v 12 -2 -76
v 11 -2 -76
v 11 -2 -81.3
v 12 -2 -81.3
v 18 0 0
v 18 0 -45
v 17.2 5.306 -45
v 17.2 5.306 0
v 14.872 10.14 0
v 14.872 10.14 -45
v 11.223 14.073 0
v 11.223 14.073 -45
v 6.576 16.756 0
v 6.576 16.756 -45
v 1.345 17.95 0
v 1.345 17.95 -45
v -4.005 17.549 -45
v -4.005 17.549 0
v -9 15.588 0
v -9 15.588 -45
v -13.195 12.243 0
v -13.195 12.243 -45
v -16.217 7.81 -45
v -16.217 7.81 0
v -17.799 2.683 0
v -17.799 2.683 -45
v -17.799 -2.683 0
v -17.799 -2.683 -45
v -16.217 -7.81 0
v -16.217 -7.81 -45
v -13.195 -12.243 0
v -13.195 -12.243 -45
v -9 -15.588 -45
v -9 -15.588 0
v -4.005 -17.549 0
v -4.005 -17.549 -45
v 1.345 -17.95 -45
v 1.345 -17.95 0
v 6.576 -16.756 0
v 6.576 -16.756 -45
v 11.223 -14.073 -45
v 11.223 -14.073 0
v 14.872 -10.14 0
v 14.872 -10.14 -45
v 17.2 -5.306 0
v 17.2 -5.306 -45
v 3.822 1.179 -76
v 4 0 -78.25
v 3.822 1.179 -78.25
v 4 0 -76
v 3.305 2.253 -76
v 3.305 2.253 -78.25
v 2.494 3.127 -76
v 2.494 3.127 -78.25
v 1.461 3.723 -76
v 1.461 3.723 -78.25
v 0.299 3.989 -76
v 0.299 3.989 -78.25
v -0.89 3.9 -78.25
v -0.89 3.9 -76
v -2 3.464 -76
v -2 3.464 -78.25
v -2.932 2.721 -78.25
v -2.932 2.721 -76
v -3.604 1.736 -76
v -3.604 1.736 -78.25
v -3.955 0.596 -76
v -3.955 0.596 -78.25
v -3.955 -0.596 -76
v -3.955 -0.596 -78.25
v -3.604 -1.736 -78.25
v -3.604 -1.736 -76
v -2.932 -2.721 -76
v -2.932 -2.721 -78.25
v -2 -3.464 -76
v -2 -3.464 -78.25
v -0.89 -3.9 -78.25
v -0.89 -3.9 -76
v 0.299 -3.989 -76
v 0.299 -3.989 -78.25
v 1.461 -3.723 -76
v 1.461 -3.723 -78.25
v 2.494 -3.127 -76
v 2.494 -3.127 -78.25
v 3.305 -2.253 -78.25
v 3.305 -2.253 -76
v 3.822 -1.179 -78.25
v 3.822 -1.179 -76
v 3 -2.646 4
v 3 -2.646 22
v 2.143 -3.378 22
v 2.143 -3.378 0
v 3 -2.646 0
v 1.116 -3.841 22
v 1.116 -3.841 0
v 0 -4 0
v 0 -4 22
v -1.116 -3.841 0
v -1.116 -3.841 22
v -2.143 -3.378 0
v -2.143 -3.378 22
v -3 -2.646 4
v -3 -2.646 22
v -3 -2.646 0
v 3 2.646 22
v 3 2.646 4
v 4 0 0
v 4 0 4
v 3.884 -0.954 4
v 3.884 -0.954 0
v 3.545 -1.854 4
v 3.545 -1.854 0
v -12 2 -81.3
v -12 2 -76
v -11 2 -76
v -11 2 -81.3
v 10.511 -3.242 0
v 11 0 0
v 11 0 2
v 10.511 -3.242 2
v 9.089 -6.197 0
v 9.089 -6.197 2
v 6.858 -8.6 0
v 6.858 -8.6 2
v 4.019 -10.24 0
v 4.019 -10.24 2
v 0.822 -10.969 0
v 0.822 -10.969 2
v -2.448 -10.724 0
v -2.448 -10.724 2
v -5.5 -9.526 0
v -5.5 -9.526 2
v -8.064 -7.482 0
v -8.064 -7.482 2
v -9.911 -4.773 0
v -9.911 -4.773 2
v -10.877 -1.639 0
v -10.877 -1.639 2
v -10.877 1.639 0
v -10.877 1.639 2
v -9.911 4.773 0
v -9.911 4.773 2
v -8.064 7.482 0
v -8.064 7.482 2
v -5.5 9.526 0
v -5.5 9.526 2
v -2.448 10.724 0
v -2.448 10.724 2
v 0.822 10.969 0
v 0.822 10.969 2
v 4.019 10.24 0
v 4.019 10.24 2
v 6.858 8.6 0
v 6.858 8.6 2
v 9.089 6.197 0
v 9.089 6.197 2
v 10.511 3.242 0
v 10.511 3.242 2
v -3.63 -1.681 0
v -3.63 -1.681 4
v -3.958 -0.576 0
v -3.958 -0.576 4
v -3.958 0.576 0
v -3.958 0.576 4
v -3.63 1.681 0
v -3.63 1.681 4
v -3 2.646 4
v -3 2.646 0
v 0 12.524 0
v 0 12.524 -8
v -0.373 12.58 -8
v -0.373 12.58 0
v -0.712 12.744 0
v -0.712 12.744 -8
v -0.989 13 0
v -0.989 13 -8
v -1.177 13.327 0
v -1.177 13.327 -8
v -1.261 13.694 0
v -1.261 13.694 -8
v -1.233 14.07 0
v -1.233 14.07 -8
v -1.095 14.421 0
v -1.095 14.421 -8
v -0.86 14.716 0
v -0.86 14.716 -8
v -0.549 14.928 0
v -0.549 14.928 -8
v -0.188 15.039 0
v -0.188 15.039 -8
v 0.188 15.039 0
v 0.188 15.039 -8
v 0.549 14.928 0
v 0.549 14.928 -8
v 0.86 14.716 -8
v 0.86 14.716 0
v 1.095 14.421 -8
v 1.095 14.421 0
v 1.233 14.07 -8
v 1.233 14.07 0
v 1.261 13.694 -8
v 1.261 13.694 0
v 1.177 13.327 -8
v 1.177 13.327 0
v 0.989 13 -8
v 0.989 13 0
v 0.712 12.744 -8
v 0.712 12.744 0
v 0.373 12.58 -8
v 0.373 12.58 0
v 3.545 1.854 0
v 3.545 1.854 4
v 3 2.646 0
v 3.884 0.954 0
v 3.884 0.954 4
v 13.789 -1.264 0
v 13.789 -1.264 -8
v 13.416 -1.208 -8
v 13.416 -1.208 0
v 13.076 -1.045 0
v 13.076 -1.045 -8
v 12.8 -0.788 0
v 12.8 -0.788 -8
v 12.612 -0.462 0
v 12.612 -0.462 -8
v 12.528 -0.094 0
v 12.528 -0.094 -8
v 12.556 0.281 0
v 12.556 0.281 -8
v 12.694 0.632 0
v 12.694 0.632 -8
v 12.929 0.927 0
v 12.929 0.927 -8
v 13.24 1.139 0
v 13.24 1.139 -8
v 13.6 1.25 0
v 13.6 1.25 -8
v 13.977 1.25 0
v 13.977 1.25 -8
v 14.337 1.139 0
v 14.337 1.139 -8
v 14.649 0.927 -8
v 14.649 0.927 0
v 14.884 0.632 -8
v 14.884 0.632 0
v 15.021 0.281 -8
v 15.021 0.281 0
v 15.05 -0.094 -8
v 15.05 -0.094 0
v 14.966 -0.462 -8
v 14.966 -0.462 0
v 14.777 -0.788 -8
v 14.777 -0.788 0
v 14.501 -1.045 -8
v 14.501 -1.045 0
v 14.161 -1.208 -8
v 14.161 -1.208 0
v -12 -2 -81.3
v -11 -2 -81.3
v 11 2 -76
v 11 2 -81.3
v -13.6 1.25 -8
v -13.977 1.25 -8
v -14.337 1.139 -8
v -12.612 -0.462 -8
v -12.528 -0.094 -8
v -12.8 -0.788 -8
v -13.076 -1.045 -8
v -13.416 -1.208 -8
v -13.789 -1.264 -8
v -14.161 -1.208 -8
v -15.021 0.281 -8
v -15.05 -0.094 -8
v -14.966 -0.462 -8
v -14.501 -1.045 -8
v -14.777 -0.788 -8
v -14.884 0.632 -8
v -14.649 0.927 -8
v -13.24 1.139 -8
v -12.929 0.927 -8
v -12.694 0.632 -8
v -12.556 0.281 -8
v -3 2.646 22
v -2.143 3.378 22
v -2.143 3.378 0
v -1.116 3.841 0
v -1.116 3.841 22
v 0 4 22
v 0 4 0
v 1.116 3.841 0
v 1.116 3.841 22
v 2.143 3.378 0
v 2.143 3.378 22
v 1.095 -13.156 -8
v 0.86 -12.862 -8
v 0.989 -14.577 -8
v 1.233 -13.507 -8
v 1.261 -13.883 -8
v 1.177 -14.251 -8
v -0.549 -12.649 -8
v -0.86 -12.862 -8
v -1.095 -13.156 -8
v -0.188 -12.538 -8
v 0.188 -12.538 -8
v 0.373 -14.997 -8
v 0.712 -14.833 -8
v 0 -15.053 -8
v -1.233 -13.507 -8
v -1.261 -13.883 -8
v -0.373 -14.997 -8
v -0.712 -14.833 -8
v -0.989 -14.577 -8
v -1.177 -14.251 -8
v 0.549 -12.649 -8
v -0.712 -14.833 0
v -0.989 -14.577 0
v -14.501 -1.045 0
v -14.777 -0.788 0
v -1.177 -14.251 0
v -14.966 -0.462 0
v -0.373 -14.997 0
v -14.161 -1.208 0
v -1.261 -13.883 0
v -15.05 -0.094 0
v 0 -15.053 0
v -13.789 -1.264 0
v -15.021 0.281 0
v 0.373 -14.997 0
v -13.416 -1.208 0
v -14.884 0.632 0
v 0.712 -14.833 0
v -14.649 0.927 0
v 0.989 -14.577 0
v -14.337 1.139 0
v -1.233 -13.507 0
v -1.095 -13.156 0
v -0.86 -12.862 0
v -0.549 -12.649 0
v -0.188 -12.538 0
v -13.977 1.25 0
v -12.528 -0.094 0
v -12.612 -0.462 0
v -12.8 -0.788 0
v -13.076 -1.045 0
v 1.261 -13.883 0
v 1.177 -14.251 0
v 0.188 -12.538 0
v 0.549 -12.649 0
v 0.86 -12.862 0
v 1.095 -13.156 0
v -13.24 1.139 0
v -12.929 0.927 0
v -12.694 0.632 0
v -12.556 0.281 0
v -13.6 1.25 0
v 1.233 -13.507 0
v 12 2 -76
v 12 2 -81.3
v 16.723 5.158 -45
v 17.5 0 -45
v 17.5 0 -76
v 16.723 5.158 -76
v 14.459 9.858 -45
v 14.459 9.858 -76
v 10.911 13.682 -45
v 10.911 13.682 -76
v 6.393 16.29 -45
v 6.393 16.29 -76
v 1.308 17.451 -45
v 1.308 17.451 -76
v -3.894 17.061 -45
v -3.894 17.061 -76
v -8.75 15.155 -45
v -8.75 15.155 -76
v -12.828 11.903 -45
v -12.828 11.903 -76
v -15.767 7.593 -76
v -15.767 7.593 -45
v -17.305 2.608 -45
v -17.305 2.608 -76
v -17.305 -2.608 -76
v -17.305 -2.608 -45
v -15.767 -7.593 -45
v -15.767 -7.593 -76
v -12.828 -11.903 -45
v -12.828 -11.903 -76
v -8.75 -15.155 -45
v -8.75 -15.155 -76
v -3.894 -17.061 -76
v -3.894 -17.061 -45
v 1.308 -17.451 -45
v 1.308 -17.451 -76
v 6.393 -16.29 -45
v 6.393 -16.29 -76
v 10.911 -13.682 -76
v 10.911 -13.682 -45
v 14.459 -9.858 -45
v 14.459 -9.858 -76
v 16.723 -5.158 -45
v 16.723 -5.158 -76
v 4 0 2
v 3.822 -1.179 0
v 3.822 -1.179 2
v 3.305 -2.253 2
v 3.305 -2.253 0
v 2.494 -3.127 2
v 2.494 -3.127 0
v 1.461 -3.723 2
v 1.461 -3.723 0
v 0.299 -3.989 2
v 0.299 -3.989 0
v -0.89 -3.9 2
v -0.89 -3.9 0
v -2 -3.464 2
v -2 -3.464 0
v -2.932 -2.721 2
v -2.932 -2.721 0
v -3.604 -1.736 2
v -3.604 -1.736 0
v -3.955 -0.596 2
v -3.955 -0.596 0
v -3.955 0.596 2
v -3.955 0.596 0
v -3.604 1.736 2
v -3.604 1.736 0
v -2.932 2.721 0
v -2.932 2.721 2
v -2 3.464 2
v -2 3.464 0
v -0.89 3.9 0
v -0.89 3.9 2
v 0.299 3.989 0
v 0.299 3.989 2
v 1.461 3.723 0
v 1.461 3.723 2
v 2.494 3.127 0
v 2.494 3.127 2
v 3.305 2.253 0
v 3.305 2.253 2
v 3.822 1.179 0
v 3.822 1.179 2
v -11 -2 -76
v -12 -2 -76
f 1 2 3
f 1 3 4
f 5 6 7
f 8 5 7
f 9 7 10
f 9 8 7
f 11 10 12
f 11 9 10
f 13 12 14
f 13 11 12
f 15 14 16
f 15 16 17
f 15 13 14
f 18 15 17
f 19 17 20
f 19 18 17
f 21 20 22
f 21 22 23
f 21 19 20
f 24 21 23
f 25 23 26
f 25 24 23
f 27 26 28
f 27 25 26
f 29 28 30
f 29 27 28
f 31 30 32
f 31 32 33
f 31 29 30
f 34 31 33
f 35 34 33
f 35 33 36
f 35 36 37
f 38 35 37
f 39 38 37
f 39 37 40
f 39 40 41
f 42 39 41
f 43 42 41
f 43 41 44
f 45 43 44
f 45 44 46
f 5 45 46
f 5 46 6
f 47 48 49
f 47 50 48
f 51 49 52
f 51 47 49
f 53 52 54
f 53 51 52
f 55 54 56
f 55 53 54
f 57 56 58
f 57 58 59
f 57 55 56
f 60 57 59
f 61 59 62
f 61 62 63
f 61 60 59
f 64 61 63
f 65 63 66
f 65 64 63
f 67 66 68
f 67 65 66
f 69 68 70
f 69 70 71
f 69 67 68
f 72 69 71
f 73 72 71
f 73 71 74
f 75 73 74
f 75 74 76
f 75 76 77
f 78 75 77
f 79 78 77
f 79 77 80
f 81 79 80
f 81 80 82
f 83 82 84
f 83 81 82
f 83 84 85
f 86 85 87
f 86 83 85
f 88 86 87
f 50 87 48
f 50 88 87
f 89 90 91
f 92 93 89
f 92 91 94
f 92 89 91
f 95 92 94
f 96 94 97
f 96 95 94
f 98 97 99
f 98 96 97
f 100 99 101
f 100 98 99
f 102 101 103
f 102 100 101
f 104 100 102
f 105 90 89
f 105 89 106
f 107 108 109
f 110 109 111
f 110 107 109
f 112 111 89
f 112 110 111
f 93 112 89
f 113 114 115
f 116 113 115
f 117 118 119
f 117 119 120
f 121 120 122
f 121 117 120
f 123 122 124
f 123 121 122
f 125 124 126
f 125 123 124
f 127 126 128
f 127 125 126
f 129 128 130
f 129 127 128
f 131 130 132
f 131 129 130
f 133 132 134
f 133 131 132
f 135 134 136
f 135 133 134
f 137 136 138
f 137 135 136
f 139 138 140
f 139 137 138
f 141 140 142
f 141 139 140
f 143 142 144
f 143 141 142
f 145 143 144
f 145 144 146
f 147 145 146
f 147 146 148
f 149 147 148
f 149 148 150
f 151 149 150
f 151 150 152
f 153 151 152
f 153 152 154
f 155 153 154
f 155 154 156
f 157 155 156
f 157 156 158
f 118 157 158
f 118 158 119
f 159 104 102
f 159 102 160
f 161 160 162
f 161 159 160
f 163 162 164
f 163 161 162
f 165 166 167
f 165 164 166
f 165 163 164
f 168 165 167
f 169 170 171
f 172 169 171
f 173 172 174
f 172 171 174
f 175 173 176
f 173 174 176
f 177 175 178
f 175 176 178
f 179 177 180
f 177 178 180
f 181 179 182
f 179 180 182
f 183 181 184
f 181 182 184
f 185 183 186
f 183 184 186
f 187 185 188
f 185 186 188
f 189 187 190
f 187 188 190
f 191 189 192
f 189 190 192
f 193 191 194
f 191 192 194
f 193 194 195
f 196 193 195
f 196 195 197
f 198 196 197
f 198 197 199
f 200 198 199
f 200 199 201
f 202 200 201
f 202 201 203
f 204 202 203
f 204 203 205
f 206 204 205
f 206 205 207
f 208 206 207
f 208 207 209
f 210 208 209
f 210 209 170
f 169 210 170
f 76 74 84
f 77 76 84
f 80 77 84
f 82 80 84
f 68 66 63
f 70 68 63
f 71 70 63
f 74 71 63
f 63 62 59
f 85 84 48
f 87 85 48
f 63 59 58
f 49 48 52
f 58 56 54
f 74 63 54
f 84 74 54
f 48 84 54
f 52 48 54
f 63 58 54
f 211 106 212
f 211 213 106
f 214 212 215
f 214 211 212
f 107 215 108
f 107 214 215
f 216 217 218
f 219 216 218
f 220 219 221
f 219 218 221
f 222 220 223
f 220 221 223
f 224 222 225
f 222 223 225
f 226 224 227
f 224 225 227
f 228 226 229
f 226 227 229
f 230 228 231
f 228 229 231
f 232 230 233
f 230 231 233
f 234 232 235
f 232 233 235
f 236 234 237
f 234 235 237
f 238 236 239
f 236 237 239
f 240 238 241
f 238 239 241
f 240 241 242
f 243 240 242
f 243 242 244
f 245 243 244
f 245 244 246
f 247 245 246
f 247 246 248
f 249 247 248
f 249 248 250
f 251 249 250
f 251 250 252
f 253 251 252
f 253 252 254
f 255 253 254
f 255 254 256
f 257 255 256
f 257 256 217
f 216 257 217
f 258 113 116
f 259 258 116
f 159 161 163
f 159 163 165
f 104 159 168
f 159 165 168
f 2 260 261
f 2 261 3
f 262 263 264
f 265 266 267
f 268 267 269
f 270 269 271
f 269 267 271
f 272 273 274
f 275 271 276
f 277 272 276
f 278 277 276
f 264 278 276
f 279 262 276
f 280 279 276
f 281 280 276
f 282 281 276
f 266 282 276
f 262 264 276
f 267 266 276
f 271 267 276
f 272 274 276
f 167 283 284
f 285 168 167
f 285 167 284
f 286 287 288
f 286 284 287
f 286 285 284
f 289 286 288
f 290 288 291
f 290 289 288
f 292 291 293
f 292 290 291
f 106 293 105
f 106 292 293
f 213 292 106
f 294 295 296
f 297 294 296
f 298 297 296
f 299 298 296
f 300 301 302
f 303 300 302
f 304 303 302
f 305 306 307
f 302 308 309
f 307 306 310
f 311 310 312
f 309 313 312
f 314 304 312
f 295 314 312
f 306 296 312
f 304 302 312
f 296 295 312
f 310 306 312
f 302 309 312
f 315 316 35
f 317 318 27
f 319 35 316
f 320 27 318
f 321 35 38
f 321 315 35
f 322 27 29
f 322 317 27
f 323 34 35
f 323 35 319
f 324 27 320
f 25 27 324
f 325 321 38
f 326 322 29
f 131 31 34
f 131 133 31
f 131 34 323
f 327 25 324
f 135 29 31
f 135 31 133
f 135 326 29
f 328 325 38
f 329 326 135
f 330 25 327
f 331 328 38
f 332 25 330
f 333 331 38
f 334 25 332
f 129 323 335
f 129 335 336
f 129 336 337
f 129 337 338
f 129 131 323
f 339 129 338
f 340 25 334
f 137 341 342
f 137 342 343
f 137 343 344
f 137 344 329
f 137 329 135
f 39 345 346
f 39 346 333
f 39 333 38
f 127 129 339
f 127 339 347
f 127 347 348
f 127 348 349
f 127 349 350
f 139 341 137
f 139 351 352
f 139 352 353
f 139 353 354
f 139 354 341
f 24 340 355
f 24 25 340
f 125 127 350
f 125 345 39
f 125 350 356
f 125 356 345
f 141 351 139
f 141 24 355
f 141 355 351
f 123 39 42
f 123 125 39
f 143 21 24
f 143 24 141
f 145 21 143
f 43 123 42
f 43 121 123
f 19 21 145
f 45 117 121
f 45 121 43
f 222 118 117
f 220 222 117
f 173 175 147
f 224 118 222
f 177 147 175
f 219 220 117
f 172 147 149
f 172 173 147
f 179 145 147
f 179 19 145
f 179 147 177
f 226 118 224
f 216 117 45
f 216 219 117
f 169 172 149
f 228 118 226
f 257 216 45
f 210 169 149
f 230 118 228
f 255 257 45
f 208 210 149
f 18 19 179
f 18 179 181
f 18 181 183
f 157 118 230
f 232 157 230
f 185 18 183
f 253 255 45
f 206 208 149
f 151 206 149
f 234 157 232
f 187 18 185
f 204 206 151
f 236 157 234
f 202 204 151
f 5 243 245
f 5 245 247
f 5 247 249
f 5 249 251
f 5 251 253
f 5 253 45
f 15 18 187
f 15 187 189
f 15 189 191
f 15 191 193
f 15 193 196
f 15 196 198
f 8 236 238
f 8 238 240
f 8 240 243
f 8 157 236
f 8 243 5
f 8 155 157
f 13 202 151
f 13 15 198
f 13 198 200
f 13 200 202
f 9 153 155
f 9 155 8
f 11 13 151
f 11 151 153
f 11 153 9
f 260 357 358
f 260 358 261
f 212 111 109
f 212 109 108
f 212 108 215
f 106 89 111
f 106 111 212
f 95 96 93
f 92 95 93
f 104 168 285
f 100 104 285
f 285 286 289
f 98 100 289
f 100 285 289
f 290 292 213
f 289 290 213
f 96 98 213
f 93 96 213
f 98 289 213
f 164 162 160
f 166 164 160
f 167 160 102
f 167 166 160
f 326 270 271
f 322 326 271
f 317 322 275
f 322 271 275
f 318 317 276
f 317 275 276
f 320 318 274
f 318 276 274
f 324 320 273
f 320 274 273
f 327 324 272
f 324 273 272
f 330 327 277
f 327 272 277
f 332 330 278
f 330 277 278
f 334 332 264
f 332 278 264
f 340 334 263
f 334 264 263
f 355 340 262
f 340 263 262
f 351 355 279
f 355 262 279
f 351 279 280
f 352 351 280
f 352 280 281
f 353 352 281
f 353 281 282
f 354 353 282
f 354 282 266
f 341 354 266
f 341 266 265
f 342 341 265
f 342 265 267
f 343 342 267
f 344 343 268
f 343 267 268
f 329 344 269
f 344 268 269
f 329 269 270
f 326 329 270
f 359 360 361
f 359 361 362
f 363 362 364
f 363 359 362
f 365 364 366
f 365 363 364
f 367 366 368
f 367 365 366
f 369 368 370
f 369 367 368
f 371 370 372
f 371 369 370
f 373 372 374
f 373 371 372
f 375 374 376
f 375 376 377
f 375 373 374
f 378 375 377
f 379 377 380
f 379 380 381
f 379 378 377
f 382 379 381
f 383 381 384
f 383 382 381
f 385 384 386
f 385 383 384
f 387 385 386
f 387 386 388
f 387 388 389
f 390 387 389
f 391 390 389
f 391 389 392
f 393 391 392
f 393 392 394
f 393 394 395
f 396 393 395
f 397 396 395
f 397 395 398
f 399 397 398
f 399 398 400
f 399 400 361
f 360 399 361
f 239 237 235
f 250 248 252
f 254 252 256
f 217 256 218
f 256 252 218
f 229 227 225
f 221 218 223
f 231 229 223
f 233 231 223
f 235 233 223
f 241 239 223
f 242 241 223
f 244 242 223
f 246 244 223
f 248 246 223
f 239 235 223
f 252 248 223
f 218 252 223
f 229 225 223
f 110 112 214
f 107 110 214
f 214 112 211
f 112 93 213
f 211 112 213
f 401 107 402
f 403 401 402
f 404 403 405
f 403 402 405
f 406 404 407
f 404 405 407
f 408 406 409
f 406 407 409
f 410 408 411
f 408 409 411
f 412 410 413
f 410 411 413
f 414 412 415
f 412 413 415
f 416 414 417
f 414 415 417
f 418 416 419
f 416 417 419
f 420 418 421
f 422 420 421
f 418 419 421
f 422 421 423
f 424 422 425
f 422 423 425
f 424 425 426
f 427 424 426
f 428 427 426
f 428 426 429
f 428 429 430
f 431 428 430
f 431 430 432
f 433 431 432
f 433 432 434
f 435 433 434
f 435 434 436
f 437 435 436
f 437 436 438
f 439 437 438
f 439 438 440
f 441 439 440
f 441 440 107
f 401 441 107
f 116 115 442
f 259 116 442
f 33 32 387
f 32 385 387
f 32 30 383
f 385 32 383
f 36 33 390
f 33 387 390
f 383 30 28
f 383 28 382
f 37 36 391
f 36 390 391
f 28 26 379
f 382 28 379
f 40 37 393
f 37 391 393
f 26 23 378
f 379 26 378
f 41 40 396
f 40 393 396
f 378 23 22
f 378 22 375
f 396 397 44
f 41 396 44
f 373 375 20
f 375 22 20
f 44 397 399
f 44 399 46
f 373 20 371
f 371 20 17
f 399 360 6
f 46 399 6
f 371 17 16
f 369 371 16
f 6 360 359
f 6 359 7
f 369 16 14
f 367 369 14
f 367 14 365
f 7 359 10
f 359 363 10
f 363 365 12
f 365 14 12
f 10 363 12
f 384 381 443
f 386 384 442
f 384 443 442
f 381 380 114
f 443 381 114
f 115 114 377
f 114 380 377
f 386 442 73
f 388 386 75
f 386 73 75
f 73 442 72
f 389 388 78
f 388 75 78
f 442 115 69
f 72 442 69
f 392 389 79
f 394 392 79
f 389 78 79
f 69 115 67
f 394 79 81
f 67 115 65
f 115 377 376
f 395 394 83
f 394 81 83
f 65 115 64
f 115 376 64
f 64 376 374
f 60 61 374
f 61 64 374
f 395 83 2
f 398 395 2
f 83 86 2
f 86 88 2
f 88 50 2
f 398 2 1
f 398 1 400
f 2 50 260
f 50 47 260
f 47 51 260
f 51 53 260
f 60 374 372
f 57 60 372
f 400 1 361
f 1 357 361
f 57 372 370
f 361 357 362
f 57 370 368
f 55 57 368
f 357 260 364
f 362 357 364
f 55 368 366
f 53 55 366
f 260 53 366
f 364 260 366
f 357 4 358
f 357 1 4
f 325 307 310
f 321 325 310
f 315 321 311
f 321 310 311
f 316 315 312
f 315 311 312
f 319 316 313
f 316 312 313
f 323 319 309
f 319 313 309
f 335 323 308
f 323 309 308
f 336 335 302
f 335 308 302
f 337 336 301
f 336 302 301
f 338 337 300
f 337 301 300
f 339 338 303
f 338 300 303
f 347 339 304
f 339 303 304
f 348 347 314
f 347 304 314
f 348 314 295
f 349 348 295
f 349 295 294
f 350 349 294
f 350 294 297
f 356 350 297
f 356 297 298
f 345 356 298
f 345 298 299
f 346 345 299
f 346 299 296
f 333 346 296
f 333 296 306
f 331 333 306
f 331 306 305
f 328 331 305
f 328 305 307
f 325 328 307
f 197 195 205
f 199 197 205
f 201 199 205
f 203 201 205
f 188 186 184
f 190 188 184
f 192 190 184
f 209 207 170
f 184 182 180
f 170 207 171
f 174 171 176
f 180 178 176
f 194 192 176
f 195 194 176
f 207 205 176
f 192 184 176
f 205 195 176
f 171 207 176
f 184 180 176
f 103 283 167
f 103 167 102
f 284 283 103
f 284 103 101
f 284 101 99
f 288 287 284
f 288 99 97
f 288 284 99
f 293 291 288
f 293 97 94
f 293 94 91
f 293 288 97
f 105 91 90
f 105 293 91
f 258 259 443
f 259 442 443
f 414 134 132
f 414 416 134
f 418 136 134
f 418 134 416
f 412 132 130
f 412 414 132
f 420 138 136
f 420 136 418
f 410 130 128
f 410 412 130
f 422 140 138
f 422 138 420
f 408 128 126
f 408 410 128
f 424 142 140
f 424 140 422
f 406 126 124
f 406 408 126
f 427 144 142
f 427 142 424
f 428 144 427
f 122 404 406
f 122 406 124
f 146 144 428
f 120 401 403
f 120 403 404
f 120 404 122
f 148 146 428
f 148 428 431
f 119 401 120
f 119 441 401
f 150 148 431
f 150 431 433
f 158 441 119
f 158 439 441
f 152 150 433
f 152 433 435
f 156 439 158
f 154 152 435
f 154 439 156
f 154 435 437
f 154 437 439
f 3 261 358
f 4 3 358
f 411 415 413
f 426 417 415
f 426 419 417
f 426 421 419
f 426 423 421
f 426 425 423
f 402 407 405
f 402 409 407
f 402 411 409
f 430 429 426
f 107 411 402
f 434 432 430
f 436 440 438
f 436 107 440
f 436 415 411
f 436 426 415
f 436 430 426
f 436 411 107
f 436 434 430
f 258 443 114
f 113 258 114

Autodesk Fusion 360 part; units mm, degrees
sketch "Sketch1" plane through (0, 0, 0) normal (0, 0, 1) x (1, 0, 0)
  circle A0 centre (0, 0) radius 17.5
  circle A1 centre (0, 0) radius 18
  line L0 (0, 0) -> (11.5, 0) construction
  line L1 (0, 1) -> (0, -1) construction
  line L2 (12, 2) -> (11, 2)
  line L3 (11, 2) -> (11, -2)
  line L4 (11, -2) -> (12, -2)
  line L5 (12, -2) -> (12, 2)
  line L6 (12, 2) -> (11, -2) construction
  line L7 (11, 2) -> (12, -2) construction
  line L8 (-11, 2) -> (-11, -2)
  line L9 (-11, -2) -> (-12, -2)
  line L10 (-12, -2) -> (-12, 2)
  line L11 (-12, 2) -> (-11, 2)
  circle A2 centre (0, 0) radius 11
  circle A3 centre (0, 0) radius 4
  line L12 (-3, 2.6458) -> (-3, -2.6458)
  line L13 (3, -2.6458) -> (3, 2.6458)
  line L14 (3, 2.6458) -> (-3, -2.6458) construction
  line L15 (-3, 2.6458) -> (3, -2.6458) construction
  line L16 (0, 13.7886) -> (-13.7886, 0) construction
  line L17 (-13.7886, 0) -> (0, -13.7886) construction
  line L18 (0, -13.7886) -> (13.7886, 0) construction
  line L19 (13.7886, 0) -> (0, 13.7886) construction
  line L20 (0, 13.7886) -> (0, -13.7886) construction
  line L21 (-13.7886, 0) -> (13.7886, 0) construction
  point P0 (11.5, 0)
  point P1 (-13.7886, 0)
  point P2 (0, 13.7886)
  point P3 (13.7886, 0)
  point P4 (0, -13.7886)
  dimension "d1" = 35
  dimension "d2" = 36
  dimension "d3" = 11.5
  dimension "d4" = 1
  dimension "d5" = 4
  dimension "d6" = 22
  dimension "d7" = 8
  dimension "d8" = 6
  dimension "d9" = 19.5
  dimension "d10" = 19.5
extrude "Extrude1" add sketch "Sketch1" against normal blind 45 contours A0 | A1 | L2 L3 L4 L5 | L8 L9 L10 L11 | A2 | A3 L13 | A3 L12 L13 | A3 L12 makes body 1 in component "Gearmotor"
extrude "Extrude2" add sketch "Sketch1" against normal blind 31 from surface at -45 contours A0 | L2 L3 L4 L5 | L8 L9 L10 L11 | A2 | A3 L13 | A3 L12 L13 | A3 L12 bodies 1 in component "Gearmotor"
extrude "Extrude3" add sketch "Sketch1" against normal blind 2.25 from surface at -76 contours A3 L13 | A3 L12 L13 | A3 L12 bodies 1 in component "Gearmotor"
extrude "Extrude4" add sketch "Sketch1" against normal blind 5.3 from surface at -76 contours L2 L3 L4 L5 | L8 L9 L10 L11 bodies 1 in component "Gearmotor"
extrude "Extrude5" add sketch "Sketch1" along normal blind 2 contours A2 bodies 1 in component "Gearmotor"
extrude "Extrude1'" add sketch "Sketch1" along normal blind 22 separate body contours A3 L13 | A3 L12 L13 | A3 L12 makes body 2 in component "Shaft"
extrude "Extrude2'" cut sketch "Sketch1" against normal blind 18 from surface at 22 contours A3 L13 | A3 L12 bodies 2 in component "Shaft"
hole "Hole1" at (-13.7886, 0, 0) at (0, 13.7886, 0) at (13.7886, 0, 0) at (0, -13.7886, 0) direction (0, 0, -1) diameter 2.529 depth 8 tip angle 180 bodies 1 in component "Gearmotor"
component "Gearmotor" placed x (1, 0, 0) y (0, 1, 0) z (0, 0, 1) at (0, 0, 0)
component "Shaft" placed x (1, 0, 0) y (0, 1, 0) z (0, 0, 1) at (0, 0, 0)
